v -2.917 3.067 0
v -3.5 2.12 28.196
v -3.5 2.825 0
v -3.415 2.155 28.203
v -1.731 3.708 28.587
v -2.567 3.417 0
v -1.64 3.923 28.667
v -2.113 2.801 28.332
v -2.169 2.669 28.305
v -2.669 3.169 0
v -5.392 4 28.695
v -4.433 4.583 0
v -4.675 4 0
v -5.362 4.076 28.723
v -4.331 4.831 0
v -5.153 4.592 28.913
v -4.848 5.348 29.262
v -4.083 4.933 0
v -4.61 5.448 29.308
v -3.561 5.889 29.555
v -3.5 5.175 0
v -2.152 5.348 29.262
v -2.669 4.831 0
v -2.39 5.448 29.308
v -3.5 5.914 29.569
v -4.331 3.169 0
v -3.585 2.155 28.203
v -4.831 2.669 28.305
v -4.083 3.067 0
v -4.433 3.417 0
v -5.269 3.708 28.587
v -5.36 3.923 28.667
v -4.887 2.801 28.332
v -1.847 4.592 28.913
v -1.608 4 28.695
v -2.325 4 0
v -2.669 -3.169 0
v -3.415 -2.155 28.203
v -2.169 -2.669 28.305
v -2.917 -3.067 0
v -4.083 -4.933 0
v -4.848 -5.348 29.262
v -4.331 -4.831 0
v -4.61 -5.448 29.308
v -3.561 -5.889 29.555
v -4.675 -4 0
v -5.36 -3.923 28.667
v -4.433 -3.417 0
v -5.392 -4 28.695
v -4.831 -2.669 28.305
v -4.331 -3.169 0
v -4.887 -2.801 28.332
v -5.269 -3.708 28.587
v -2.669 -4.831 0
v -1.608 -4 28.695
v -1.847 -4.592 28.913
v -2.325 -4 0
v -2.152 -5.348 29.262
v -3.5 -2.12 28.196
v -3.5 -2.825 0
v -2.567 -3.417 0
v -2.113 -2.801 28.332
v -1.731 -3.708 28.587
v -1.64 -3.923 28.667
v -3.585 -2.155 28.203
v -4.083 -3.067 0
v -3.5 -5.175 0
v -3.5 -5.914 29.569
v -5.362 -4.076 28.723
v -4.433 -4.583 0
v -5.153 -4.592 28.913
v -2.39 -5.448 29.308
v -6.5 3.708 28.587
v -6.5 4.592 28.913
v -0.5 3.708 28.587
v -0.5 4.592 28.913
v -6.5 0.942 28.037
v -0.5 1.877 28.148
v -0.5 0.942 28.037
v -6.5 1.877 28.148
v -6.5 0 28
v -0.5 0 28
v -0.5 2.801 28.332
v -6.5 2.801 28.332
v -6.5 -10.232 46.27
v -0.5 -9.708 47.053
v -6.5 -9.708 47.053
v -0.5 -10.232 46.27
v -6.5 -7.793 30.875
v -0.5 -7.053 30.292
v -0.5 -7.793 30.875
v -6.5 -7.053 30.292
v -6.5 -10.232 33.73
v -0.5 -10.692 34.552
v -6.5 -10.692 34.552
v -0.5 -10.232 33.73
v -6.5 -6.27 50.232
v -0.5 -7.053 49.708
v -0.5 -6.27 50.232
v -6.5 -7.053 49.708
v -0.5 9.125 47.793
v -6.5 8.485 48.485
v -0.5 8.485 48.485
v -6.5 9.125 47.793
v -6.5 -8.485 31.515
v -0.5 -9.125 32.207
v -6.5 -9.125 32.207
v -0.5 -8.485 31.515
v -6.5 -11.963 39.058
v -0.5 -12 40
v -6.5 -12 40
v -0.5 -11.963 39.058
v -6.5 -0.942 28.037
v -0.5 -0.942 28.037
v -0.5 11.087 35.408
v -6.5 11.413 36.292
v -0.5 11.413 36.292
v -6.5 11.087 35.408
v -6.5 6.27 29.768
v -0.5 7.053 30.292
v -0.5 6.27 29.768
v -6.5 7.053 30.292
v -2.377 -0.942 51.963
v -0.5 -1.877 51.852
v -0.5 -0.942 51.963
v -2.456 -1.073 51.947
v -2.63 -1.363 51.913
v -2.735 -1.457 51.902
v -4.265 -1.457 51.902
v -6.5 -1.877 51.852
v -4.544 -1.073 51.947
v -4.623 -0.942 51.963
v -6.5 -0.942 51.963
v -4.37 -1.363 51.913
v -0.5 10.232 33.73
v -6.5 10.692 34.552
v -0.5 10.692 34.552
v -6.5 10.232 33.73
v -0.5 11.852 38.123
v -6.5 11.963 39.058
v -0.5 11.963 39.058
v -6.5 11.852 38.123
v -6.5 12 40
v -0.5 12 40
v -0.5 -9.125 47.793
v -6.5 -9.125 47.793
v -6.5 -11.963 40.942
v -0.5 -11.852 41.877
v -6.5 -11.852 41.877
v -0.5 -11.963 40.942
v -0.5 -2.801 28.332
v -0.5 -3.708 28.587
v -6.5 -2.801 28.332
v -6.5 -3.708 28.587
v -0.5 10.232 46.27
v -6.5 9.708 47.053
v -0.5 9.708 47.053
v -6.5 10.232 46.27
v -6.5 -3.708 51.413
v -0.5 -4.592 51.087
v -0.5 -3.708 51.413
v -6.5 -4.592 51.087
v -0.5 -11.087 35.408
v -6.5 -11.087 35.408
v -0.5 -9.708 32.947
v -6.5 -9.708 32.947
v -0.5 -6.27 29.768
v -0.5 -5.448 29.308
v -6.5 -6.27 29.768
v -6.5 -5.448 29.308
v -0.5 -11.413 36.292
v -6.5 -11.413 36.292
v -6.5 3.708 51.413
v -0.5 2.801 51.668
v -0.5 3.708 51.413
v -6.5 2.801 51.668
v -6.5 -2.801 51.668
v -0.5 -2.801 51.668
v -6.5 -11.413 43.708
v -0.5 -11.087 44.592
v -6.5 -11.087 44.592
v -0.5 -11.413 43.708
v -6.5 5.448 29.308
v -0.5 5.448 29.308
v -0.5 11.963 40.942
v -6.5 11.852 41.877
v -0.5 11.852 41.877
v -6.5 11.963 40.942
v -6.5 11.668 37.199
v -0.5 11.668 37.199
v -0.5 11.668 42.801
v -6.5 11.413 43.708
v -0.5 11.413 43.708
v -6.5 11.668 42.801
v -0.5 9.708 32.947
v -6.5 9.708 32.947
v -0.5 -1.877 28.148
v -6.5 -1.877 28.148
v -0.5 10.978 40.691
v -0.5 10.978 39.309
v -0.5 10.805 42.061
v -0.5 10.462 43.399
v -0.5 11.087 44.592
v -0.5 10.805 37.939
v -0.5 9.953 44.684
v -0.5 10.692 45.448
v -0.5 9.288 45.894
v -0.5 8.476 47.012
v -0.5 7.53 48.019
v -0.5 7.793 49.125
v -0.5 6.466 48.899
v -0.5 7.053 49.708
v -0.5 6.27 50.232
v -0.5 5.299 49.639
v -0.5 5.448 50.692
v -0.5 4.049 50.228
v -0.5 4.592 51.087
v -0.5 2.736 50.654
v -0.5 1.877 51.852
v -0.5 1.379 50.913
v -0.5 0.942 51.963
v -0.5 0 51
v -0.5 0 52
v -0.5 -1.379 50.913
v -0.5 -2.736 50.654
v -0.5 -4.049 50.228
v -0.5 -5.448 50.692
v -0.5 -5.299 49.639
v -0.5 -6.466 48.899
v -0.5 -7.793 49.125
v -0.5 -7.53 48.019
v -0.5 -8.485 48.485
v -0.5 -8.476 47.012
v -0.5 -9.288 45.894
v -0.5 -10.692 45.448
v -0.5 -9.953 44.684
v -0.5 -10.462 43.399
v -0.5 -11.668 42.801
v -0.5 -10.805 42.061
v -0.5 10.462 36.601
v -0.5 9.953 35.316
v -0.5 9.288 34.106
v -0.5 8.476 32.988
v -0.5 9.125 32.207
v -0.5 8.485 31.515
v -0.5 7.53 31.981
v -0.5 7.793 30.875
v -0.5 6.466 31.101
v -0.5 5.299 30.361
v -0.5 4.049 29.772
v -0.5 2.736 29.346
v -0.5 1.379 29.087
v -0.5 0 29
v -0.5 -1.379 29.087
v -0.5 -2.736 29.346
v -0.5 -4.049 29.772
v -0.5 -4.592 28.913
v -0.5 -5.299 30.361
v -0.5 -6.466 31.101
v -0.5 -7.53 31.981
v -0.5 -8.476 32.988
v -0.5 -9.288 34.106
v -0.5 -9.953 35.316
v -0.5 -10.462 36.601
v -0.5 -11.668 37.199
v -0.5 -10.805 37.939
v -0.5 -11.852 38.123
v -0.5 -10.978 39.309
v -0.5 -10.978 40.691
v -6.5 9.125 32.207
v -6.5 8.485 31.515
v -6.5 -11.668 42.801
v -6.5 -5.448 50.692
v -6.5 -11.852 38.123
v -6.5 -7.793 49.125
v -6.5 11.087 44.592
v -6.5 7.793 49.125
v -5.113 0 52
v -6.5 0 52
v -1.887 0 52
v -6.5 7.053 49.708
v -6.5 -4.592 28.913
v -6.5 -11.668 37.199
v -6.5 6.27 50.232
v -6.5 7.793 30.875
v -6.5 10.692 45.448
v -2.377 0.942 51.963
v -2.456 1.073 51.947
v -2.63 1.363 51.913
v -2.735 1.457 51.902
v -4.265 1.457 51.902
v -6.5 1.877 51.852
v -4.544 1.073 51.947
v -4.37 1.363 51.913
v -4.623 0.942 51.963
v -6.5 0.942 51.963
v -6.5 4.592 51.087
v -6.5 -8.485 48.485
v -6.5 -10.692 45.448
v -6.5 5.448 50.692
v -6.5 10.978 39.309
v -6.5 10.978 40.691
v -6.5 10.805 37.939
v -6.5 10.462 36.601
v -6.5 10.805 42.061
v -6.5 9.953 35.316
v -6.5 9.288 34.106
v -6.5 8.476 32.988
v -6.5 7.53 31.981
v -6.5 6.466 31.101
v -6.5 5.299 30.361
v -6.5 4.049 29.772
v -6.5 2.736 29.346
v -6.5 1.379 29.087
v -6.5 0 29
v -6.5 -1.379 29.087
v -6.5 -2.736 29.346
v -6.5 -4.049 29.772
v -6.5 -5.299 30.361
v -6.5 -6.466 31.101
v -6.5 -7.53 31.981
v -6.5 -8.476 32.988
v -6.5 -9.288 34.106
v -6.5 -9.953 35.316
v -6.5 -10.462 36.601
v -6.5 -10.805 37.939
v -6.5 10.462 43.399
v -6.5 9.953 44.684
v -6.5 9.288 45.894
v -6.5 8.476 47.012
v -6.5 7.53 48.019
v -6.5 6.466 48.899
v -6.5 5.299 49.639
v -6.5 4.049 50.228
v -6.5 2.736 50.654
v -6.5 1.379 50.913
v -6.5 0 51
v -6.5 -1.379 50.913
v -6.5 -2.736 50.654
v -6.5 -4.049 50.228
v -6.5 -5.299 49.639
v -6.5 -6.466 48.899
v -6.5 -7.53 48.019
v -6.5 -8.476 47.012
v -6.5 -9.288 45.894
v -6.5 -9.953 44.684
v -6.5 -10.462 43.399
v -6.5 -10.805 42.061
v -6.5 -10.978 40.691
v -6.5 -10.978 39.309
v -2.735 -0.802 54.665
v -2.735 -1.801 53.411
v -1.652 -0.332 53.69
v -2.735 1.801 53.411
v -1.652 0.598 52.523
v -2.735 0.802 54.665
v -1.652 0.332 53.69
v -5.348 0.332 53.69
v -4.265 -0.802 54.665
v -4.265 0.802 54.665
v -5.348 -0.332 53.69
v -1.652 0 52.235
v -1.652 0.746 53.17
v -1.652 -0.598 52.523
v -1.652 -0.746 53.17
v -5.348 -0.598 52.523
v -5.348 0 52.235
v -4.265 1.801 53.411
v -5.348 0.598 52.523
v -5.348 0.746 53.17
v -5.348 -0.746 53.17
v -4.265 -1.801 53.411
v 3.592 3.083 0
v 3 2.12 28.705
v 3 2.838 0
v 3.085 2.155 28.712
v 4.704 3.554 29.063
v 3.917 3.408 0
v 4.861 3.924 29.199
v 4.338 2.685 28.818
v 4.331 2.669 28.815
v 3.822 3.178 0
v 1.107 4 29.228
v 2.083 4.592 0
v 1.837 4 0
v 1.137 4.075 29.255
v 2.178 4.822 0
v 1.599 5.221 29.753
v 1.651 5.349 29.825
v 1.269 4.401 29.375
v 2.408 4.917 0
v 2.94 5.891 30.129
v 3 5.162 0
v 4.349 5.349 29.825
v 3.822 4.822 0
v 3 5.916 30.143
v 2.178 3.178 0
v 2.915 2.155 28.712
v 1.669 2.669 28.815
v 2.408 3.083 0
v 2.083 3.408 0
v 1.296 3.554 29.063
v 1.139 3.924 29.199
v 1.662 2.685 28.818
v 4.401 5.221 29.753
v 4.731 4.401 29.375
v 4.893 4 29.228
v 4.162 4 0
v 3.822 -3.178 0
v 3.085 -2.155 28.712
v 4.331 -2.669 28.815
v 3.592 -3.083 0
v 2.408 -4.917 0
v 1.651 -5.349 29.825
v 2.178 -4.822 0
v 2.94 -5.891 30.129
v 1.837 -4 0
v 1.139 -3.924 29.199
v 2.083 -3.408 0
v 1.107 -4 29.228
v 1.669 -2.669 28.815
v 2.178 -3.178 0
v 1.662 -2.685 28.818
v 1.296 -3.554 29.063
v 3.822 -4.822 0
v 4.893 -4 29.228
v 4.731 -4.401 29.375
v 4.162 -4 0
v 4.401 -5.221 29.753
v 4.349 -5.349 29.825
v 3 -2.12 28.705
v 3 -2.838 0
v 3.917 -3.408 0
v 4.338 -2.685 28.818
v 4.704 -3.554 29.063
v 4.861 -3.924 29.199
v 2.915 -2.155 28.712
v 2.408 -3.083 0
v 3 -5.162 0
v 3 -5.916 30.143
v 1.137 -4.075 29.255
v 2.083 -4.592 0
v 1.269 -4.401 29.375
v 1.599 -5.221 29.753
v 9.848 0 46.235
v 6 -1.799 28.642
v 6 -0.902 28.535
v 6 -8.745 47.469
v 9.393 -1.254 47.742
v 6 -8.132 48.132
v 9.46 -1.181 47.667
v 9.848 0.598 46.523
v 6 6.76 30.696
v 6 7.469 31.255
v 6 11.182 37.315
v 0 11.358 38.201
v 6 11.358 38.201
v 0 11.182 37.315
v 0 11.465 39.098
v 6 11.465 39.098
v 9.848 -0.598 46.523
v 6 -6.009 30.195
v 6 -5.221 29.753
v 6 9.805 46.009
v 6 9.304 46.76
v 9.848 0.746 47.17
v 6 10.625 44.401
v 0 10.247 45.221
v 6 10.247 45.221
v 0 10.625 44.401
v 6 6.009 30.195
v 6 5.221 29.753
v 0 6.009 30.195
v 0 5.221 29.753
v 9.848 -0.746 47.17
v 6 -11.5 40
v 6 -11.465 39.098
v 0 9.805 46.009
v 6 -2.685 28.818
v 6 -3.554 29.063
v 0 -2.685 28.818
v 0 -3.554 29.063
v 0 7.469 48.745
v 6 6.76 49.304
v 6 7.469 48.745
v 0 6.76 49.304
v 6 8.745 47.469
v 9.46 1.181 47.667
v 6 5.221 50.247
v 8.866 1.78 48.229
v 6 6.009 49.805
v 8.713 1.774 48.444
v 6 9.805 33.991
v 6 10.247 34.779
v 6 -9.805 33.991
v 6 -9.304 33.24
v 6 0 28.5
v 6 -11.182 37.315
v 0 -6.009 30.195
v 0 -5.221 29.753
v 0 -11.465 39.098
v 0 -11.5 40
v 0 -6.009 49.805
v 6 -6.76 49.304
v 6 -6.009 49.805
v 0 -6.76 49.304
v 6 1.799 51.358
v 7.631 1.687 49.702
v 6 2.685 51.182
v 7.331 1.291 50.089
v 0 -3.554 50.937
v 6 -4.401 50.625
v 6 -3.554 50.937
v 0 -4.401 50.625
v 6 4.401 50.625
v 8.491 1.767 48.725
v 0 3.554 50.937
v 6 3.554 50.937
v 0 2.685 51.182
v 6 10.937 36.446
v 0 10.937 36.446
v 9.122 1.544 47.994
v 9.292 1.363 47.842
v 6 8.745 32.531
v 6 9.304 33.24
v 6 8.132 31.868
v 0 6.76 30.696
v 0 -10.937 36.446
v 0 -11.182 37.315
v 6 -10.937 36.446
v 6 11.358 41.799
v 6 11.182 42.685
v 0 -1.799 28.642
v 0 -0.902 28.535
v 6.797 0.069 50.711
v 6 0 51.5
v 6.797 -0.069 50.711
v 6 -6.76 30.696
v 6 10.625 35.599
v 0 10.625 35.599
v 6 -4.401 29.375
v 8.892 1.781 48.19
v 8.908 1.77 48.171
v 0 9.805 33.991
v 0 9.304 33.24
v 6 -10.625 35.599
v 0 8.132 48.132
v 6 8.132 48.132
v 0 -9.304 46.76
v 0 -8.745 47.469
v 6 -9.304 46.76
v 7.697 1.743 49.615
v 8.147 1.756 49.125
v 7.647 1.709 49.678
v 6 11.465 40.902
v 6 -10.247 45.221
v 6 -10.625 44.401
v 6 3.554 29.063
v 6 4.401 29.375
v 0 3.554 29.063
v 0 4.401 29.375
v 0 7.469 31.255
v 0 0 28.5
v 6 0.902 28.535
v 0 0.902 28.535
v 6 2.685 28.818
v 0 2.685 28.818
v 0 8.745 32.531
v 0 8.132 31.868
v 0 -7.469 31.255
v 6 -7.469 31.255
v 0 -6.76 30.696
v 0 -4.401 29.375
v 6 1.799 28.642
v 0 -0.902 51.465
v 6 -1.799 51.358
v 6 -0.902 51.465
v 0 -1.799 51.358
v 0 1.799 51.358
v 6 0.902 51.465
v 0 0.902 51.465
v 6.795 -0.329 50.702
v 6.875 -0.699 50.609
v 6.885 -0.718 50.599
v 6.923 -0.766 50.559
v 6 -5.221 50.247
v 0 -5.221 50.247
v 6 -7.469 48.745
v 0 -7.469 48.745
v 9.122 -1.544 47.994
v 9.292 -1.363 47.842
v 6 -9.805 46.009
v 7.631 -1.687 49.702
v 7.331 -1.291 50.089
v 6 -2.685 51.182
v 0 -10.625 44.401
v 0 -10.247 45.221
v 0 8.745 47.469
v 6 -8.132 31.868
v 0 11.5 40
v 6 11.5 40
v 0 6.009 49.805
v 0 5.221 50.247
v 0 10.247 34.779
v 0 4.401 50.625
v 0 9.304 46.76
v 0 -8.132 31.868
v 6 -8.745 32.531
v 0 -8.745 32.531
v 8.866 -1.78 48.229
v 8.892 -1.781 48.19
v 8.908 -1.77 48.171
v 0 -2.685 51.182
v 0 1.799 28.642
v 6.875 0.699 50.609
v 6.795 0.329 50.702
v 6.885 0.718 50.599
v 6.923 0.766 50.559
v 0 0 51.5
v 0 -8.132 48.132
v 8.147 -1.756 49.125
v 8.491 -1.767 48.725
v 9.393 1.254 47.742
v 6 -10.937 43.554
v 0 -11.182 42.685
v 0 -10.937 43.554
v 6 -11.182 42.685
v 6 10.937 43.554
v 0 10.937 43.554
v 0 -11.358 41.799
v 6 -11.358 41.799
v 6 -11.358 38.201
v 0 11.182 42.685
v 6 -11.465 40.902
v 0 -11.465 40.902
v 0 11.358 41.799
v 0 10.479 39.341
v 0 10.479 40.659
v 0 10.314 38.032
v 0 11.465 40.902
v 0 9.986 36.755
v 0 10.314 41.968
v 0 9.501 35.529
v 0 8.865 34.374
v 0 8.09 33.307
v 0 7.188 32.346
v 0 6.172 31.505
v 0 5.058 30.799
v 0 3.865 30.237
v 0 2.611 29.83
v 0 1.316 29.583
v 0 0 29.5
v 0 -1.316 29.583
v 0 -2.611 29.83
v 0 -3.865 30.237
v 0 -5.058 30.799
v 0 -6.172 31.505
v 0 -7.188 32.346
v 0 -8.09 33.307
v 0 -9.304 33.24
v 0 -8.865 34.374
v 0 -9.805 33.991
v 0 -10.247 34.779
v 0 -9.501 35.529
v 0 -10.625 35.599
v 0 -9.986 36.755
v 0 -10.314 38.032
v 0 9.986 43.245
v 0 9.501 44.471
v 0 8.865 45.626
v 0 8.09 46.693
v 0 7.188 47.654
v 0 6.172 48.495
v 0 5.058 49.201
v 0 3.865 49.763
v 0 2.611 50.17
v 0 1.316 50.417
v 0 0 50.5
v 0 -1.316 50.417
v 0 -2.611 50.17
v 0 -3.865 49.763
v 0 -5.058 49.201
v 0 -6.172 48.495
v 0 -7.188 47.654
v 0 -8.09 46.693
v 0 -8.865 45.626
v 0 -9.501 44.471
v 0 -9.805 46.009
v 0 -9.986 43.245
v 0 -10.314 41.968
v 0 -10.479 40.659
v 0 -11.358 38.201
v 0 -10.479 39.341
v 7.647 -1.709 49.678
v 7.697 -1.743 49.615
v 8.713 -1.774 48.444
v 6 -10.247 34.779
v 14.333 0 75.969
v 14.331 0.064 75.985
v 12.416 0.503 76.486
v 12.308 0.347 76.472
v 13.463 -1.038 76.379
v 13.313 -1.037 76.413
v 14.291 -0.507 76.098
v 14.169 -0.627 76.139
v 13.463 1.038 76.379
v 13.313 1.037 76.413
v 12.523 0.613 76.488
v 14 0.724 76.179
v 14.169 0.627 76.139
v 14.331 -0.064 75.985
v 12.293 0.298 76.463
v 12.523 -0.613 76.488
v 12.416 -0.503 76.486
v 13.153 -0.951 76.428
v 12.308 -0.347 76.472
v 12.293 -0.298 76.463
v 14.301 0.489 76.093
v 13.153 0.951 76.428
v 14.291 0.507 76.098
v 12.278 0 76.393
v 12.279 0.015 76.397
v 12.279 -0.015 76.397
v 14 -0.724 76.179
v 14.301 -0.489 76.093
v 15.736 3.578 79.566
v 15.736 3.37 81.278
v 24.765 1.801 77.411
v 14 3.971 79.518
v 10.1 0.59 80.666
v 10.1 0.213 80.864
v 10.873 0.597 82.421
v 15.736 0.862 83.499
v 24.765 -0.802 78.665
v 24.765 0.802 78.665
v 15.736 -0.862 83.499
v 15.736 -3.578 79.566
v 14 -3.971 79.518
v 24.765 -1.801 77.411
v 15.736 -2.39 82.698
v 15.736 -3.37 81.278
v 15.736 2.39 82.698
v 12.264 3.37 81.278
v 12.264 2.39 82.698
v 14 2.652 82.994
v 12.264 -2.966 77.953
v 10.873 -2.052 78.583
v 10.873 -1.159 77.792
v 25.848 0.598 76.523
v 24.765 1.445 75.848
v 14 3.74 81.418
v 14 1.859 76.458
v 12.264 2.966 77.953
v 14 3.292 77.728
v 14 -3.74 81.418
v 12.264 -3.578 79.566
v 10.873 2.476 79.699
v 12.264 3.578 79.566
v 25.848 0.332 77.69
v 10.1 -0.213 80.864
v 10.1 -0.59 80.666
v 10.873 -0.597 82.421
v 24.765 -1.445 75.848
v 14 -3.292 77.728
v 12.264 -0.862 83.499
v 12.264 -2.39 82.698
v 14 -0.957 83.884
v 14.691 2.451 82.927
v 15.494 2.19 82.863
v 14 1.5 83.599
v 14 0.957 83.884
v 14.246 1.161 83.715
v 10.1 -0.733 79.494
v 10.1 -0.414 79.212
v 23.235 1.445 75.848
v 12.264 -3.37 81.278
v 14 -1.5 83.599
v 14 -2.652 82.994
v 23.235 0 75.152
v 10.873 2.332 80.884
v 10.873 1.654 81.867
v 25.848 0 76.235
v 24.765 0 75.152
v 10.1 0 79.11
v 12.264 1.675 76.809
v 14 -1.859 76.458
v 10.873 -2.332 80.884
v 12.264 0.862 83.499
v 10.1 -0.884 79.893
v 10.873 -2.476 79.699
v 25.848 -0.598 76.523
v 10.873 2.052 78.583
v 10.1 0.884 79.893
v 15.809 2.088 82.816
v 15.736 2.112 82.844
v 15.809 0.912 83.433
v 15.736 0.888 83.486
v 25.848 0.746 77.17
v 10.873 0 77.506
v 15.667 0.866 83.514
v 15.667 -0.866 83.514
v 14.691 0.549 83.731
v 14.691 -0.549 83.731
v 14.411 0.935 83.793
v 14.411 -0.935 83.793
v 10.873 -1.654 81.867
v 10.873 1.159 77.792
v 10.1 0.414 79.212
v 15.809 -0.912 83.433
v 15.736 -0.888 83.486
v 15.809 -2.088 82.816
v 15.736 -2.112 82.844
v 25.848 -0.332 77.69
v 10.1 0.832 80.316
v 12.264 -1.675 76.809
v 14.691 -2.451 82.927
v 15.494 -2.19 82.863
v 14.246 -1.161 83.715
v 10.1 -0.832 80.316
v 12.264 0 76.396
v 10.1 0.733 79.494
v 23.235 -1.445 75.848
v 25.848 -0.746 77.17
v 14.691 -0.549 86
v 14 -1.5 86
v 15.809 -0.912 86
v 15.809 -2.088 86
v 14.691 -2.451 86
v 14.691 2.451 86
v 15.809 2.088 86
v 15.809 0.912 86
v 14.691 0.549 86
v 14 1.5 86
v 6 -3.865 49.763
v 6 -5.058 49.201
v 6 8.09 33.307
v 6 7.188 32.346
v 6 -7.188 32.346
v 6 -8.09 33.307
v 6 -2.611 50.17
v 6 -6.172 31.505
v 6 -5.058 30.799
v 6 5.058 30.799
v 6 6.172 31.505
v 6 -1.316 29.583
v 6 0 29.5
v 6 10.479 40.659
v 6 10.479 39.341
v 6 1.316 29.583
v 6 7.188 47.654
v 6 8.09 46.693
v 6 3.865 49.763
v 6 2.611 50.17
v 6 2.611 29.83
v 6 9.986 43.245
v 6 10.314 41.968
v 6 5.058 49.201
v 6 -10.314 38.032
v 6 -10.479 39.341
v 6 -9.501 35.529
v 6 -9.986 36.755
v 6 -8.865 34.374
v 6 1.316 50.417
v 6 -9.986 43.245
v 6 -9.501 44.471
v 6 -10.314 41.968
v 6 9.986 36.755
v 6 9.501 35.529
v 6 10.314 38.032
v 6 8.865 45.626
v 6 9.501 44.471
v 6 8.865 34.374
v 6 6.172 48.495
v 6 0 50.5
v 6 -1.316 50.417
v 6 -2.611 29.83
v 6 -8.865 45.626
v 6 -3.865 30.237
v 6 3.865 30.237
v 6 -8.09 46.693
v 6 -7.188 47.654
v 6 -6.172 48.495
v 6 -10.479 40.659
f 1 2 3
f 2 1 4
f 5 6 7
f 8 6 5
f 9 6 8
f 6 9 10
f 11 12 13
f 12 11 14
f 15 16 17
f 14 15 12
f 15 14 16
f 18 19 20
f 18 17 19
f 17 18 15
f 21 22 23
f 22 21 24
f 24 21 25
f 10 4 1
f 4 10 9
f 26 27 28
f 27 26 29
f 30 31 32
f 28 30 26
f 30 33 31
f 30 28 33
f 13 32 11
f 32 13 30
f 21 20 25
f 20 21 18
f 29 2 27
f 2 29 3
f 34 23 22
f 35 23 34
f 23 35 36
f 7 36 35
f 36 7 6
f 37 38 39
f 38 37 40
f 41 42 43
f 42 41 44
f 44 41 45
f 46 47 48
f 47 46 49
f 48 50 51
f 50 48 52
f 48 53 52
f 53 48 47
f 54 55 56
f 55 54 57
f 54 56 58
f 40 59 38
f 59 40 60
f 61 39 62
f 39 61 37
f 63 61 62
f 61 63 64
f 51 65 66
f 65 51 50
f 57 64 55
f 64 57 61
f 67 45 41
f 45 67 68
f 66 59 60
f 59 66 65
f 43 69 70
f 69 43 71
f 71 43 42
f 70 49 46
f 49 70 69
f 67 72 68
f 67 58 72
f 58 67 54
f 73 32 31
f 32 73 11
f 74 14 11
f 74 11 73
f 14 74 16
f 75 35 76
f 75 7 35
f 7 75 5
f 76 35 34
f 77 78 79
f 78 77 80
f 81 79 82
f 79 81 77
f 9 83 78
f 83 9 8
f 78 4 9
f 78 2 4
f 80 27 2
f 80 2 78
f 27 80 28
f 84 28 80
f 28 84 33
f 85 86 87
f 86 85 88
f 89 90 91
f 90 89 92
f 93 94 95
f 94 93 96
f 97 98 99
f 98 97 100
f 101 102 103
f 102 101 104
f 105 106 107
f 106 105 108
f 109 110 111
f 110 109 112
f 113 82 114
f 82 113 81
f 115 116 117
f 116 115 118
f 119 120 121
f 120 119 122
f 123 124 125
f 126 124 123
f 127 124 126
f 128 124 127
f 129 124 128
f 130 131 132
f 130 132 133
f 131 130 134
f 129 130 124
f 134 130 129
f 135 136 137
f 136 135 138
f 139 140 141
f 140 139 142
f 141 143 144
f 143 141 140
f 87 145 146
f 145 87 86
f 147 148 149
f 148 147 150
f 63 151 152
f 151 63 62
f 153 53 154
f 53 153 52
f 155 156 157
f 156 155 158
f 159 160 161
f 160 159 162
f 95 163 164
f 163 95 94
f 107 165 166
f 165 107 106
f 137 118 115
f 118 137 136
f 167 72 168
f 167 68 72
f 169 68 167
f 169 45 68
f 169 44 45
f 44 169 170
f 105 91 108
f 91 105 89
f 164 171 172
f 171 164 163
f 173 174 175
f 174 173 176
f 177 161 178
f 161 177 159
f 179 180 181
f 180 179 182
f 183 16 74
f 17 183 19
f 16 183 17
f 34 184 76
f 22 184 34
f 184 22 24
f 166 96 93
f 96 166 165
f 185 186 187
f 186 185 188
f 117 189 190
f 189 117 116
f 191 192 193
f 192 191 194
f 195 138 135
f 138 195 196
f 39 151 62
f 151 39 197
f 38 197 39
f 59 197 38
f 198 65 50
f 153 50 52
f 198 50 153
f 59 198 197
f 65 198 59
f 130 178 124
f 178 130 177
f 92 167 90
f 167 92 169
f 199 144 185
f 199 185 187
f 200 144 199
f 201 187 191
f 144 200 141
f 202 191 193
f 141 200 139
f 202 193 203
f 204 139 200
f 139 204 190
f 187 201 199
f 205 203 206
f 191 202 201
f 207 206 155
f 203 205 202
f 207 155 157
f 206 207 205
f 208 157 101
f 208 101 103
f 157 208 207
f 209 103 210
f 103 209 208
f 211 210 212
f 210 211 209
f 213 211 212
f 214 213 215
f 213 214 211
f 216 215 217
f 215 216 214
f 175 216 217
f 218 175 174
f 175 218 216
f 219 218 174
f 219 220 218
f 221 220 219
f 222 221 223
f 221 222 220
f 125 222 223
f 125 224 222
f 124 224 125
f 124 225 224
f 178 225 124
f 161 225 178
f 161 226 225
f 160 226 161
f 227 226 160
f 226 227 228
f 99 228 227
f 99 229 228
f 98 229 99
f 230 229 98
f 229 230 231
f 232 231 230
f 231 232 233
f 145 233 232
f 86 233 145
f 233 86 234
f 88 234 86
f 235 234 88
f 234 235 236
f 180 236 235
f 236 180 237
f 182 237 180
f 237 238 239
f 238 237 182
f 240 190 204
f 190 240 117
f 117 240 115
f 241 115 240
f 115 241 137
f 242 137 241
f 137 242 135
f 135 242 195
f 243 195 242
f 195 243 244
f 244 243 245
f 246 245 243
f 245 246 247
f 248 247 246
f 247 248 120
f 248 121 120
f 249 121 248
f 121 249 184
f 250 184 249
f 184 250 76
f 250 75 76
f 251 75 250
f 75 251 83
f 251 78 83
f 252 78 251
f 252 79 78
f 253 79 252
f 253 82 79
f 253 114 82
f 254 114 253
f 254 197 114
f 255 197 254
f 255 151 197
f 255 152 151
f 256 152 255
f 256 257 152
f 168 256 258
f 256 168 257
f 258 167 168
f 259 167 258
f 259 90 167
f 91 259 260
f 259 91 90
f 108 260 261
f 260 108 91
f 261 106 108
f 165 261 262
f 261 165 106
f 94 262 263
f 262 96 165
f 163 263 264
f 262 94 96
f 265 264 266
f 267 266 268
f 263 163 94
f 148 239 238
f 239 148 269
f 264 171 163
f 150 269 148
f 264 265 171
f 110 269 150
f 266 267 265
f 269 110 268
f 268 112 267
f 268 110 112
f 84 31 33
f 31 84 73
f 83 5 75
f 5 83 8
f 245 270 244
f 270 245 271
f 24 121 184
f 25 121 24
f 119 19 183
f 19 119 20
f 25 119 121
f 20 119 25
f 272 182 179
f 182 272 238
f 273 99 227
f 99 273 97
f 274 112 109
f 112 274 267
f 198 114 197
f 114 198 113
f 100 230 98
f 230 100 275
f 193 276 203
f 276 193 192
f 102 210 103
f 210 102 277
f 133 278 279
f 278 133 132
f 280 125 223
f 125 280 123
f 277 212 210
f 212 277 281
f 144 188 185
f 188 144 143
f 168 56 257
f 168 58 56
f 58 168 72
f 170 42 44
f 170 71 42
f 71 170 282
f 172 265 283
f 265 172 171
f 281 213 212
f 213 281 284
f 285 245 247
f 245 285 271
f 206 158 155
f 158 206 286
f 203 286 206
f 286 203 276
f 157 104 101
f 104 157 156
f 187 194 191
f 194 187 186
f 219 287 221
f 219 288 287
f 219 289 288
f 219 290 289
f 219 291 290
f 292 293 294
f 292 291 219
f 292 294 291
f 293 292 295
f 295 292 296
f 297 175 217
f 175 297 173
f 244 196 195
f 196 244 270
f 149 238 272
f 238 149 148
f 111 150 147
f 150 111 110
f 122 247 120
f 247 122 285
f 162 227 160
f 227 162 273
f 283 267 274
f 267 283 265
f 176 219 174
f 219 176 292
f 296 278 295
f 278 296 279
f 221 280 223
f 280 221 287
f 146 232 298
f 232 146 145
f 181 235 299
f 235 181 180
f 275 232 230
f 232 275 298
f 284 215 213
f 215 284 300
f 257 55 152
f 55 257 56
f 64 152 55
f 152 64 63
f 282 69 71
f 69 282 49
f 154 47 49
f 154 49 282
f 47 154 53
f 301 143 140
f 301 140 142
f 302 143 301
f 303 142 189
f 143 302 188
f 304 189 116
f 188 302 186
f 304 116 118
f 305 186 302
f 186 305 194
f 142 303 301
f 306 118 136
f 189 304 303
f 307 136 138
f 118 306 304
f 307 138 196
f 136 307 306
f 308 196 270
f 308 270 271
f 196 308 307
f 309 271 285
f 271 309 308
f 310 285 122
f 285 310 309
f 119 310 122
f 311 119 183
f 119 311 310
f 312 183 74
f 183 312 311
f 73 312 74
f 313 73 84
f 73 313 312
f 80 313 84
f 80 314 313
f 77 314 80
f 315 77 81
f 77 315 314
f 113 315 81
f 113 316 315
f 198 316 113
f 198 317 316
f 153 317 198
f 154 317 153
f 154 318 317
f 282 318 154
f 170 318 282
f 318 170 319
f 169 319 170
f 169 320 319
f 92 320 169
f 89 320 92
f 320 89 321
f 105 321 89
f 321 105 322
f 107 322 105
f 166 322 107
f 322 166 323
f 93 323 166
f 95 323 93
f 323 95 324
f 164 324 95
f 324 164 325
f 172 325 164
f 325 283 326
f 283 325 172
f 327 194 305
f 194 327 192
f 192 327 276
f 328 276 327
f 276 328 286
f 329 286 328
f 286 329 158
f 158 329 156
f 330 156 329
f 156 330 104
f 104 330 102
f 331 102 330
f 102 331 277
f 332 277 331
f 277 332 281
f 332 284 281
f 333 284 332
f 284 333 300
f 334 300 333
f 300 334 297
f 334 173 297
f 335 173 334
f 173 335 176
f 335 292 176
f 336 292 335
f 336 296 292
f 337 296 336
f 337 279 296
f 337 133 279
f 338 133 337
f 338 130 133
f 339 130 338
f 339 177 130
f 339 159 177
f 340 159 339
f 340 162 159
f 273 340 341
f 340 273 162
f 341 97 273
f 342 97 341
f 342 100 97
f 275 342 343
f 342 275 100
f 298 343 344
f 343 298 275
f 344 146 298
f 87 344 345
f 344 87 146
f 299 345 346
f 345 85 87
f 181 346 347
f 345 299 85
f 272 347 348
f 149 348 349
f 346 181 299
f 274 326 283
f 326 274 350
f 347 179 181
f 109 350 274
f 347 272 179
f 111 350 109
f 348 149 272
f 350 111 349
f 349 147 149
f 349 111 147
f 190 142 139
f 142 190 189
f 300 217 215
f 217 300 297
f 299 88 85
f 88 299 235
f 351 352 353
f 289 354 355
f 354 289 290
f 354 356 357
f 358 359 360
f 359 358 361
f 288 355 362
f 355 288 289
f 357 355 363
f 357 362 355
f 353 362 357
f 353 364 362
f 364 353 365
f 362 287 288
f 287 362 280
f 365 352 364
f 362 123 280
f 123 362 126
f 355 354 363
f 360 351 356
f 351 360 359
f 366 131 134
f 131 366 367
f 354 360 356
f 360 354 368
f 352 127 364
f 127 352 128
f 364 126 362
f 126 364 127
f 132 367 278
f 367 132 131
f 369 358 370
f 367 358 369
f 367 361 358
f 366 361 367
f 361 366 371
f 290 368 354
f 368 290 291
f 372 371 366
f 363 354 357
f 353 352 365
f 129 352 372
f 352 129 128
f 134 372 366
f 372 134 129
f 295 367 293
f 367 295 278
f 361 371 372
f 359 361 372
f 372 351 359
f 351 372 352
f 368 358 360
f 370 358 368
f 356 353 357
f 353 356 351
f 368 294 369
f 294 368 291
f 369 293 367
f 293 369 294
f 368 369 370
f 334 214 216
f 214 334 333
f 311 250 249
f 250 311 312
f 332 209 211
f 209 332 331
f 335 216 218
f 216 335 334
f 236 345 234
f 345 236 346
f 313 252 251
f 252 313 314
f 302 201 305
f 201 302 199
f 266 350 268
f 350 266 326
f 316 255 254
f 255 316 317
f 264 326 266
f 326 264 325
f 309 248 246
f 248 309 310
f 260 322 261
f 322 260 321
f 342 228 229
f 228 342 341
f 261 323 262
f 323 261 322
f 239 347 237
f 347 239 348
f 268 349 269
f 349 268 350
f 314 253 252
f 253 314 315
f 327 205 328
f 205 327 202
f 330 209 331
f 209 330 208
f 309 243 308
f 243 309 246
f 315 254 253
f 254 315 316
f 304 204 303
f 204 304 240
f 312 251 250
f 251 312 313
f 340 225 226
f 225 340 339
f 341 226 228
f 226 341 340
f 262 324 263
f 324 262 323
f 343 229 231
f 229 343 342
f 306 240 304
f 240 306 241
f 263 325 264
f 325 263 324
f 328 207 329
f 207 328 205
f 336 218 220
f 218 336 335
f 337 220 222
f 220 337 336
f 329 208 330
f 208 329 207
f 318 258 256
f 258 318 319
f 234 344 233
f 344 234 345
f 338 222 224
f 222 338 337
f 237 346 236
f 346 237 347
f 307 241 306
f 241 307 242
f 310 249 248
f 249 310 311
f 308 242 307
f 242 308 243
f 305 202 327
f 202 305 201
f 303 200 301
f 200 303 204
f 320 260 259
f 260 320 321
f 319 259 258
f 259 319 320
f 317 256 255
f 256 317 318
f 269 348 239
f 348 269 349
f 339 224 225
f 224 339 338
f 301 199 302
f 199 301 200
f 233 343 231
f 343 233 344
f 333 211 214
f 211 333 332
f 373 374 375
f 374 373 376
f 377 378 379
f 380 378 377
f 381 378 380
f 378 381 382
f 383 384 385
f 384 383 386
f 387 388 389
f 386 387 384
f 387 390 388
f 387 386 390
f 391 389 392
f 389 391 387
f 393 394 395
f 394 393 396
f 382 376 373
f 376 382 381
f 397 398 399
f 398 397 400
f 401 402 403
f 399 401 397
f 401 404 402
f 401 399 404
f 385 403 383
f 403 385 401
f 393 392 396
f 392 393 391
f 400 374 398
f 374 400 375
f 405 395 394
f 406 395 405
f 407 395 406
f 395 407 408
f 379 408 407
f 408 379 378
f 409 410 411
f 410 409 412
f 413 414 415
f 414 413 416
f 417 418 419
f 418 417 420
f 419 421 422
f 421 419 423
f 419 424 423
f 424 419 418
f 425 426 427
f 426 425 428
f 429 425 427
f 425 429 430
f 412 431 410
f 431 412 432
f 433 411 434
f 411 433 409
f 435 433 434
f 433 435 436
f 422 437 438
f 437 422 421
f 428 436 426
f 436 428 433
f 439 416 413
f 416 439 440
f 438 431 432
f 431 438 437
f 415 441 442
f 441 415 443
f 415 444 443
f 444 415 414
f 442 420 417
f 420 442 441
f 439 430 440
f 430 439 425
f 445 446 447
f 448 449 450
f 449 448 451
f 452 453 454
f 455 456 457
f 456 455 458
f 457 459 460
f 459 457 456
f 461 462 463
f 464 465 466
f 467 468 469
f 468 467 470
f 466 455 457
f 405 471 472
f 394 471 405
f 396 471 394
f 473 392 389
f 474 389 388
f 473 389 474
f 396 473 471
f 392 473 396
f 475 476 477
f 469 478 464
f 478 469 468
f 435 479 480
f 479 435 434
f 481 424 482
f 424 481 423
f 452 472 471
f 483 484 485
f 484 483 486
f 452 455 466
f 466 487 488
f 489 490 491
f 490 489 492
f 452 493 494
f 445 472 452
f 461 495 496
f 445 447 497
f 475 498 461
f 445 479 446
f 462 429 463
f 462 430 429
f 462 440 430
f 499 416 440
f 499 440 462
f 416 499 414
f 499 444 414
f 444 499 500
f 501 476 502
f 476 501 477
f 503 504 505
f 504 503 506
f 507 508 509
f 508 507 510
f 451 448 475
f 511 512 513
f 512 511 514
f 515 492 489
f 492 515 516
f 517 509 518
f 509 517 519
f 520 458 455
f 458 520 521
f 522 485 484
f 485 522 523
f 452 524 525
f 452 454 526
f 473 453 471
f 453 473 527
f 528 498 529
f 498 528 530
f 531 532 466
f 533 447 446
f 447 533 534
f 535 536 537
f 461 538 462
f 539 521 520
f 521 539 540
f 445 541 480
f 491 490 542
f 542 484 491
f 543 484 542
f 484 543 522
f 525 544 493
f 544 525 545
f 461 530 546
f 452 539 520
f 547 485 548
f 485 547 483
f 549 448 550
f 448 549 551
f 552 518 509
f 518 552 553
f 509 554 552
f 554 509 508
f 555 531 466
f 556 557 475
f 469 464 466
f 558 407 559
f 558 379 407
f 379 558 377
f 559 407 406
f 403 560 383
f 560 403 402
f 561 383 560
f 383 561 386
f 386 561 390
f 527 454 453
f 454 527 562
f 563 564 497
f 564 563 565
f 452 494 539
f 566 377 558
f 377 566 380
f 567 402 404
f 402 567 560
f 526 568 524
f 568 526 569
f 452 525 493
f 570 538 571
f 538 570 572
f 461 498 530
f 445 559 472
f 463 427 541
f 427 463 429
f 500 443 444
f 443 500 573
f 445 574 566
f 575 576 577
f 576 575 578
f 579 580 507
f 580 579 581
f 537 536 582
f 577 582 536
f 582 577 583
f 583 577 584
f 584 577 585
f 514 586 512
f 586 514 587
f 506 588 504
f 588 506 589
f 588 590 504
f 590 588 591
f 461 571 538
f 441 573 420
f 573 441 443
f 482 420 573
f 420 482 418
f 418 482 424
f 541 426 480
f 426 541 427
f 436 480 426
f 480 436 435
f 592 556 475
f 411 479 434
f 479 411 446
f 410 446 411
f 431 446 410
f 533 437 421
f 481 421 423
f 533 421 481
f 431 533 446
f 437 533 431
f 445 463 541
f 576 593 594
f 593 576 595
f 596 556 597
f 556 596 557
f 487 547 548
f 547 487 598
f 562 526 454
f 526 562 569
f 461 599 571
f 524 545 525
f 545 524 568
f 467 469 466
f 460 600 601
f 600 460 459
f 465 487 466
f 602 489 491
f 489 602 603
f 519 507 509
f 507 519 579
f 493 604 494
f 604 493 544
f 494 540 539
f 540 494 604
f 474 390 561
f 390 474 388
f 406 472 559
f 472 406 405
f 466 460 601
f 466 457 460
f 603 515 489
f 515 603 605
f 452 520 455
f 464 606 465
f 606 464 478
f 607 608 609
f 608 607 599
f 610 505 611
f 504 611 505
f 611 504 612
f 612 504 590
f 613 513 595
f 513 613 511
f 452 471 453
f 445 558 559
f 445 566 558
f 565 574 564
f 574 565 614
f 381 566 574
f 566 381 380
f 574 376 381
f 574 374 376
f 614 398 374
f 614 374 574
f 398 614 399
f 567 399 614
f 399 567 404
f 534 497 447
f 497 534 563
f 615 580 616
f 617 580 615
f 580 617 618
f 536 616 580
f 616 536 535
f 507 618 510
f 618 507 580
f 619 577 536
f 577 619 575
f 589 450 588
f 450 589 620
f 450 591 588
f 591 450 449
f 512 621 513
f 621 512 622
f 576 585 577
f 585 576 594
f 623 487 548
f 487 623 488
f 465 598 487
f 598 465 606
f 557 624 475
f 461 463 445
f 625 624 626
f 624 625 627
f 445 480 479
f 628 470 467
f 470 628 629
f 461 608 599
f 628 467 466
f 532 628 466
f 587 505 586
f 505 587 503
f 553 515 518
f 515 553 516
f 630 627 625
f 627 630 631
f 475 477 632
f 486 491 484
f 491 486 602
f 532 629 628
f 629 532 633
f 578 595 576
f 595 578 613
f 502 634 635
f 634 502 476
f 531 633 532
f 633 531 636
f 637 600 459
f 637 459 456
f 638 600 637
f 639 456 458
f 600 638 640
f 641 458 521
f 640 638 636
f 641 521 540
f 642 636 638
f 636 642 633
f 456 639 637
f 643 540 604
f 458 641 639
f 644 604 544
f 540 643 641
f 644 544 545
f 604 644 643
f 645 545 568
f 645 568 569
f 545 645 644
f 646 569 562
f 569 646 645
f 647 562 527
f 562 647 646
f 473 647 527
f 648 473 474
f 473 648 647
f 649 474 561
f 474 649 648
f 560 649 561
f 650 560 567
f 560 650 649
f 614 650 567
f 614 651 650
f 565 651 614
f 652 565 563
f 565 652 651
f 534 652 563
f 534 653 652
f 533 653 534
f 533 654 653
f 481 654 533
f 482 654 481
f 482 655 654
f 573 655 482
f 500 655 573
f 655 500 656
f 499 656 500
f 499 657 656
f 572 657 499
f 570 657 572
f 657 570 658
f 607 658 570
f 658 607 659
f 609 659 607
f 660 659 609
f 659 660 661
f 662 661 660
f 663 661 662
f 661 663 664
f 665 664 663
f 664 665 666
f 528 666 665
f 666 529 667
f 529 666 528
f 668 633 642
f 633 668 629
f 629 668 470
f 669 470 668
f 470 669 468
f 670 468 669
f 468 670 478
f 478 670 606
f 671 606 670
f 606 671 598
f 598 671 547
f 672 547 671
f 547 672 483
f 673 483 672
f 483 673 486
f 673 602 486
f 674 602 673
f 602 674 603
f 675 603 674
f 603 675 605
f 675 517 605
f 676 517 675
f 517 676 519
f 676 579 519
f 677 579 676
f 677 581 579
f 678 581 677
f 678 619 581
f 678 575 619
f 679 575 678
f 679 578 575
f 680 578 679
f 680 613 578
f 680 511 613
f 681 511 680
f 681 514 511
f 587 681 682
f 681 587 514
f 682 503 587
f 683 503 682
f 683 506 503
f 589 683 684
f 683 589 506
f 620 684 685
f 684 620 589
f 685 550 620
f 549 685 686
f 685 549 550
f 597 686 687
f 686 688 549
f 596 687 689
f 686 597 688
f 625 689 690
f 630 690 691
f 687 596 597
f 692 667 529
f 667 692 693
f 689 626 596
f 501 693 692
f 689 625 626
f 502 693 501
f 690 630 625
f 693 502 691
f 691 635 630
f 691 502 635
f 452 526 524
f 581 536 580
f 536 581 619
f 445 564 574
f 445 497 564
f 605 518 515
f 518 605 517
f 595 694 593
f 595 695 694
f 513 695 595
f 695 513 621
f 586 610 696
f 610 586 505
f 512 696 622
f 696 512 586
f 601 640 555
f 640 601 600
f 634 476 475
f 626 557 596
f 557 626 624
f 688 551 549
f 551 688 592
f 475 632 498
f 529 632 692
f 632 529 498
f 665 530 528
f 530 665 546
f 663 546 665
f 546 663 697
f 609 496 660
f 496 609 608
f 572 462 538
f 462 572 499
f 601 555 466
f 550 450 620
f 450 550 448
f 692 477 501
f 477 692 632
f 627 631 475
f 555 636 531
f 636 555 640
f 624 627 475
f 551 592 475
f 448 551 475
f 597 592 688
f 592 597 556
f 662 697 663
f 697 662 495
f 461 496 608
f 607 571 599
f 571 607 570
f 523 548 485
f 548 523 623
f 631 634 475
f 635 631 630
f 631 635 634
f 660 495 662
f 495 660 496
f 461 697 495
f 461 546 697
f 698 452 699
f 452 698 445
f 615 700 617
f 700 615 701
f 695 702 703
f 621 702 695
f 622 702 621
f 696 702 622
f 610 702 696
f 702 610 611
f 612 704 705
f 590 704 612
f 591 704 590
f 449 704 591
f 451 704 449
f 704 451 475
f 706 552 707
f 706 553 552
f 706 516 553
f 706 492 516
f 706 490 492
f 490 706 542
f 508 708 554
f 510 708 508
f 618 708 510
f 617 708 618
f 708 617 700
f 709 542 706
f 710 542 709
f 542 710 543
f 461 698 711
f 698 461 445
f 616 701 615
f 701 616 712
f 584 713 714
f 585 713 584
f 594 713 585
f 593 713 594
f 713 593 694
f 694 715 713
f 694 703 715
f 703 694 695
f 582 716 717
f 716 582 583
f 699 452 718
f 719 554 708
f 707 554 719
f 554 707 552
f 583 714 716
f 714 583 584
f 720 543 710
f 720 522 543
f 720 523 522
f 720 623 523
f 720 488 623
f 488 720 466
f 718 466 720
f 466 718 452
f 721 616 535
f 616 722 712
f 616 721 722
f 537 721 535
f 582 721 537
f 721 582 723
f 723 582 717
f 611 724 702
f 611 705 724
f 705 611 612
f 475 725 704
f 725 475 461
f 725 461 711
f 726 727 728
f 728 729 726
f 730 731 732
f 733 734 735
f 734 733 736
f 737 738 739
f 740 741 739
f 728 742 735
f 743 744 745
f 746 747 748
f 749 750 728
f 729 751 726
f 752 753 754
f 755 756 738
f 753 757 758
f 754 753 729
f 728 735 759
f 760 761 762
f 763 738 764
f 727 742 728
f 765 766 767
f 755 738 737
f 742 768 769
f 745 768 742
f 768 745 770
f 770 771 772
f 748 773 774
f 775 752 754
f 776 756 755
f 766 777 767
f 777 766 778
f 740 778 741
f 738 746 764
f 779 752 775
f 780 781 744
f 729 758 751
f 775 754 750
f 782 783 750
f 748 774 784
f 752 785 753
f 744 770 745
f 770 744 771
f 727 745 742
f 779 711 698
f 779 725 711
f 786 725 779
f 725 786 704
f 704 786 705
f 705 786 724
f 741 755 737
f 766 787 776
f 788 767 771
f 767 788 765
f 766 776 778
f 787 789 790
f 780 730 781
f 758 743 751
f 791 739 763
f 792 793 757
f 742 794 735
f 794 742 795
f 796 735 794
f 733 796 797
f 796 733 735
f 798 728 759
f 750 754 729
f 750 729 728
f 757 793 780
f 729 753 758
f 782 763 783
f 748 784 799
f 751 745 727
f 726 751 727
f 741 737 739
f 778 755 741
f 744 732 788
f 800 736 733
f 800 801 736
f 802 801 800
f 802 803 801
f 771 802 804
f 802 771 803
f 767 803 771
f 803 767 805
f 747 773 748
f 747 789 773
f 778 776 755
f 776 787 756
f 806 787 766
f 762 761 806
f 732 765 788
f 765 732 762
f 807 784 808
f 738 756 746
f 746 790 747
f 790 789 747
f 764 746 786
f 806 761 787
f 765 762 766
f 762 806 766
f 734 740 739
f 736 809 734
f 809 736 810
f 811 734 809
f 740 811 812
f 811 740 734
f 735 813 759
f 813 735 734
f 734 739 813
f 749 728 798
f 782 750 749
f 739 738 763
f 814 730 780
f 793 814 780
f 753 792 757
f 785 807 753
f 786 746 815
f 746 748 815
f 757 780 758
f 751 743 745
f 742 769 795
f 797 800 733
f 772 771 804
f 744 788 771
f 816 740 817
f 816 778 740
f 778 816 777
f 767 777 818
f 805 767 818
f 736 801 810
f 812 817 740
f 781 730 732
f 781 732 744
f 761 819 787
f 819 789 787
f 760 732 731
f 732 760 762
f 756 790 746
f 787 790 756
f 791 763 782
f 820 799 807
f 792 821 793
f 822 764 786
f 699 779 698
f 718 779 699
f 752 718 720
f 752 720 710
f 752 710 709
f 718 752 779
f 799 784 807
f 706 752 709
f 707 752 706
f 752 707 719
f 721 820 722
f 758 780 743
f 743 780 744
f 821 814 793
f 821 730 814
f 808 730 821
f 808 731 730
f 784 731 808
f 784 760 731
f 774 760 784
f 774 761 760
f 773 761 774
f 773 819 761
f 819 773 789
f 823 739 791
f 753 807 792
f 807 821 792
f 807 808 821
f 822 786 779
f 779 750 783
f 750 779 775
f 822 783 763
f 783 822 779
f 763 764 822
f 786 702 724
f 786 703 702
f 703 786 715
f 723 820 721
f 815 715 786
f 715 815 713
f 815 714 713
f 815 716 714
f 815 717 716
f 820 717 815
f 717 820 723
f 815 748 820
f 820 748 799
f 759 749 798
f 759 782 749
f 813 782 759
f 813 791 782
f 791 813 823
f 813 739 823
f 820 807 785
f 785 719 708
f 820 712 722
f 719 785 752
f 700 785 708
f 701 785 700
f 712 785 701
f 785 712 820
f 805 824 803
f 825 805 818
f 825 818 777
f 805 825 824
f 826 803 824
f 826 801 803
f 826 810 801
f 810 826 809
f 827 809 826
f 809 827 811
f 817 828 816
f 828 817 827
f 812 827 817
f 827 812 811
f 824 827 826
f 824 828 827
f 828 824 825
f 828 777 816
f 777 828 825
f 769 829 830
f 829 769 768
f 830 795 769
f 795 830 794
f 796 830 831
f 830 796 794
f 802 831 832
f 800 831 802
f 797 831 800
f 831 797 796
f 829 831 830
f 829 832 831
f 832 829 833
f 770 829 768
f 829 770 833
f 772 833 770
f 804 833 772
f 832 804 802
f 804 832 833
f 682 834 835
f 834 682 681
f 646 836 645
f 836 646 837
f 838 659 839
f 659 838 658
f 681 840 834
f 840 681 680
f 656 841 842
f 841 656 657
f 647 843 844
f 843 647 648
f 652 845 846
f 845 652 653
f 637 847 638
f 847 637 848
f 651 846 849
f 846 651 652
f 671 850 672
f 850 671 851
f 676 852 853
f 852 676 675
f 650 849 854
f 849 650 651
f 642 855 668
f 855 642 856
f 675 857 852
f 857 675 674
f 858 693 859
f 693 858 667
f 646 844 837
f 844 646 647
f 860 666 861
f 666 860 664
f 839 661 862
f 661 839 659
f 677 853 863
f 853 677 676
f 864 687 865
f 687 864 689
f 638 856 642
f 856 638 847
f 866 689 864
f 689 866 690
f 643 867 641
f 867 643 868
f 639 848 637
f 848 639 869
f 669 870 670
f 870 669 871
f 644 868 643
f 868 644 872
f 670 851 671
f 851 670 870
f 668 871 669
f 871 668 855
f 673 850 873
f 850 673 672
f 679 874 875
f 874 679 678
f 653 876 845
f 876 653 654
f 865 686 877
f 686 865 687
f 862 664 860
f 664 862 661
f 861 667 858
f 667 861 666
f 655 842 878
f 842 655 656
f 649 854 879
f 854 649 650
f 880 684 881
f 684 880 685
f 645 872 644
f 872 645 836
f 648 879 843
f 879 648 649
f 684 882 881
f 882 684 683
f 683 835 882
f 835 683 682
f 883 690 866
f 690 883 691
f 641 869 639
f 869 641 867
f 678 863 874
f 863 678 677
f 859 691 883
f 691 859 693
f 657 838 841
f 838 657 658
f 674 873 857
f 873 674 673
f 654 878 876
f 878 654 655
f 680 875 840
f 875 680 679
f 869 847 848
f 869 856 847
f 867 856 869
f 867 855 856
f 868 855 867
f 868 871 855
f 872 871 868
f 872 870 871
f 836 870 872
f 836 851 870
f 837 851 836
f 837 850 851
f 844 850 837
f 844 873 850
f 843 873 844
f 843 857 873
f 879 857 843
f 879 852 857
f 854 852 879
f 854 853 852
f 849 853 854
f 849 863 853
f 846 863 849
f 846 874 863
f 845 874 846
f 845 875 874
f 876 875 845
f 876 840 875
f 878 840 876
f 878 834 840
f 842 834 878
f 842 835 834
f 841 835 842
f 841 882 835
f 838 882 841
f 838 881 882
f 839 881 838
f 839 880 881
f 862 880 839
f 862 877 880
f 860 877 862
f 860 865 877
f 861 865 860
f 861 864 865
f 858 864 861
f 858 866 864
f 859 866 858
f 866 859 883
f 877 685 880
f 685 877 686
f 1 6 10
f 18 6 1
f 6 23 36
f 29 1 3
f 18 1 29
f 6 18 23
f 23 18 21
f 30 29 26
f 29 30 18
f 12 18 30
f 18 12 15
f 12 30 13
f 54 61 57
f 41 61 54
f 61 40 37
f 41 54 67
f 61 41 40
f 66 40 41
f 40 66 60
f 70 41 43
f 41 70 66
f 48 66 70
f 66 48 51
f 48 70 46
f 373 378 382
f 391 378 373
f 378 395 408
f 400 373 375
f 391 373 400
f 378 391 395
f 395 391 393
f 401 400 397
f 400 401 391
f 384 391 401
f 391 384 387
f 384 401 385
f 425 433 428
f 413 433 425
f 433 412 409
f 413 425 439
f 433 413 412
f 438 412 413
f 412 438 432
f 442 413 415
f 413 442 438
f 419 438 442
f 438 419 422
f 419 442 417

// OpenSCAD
/**
  Cork Pal - Customizable Giraffe

  by Phil Schatzmann 
  
**/

 
corkDiameterFront=21;
corkDiameterBack=22;
legHeight=40;
neck=40;
cylinderHeight=6;



module body(corkDiameter) {
     cylinder(h=cylinderHeight, d=corkDiameter+2, center=false,$fn=80);
}

module bodyHole(corkDiameter) {
    cylinder(h=cylinderHeight+5, d=corkDiameter,$fn=50);
}
 
module legs(corkRadius) {
    translate([corkRadius/2-4,4,3]) rotate([0,90,0]) 
        cylinder(legHeight,2,1,$fn=8);
    translate([corkRadius/2-4,-4,3]) rotate([0,90,0]) 
        cylinder(legHeight,2,1,$fn=8); 
}
 
module back() {
    difference() {
        union() {
            body(corkDiameterBack);
            legs(corkDiameterBack);
            translate([-(corkDiameterBack/2+2),0,3]) 
                sphere(r=2);
        }
        translate([0,0,-5]) bodyHole(corkDiameterBack);
    }
}
 

module frontSolid() {
    union() {
        hull() {
            body(corkDiameterFront);
            translate([-7,0,8]) 
                sphere(2);
        }
        hull() {
            translate([-7,0,8]) 
                sphere(2);
        
            translate([-neck,0,14]) 
                sphere(1);                 
        }  
        hull() {
            translate([-neck,0,14]) 
                sphere(4);  
            translate([-neck+3,0,24]) 
                sphere(2);    
        }
        translate([-neck-4,-1.5,15]) rotate([0,90,0]) 
             cylinder(h=4, d1=2, d2=2, center=true);
        translate([-neck-4,1.5,15]) rotate([0,90,0]) 
             cylinder(h=4, d1=2, d2=2, center=true);

        
        translate([0,0,cylinderHeight-6]) 
            legs(corkDiameterFront);
        }
}

module front() {
     difference() {
        frontSolid();
        translate([0,0,-5])  
           bodyHole(corkDiameterFront);

    }
}

module printAll() {
    difference() {
        union() {
            if (corkDiameterBack>0){
                translate([-cylinderHeight-0.5, 0,legHeight]) rotate([0,90,0])  
                    back();
            }
            if (corkDiameterFront>0){
                translate([0,0,legHeight]) rotate([0,90,0]) 
                    front();
            }
        }
        // make feet levelled
        translate([-500,-500,-100]) cube(size=[1000,1000,100]);
    }
}



printAll();
